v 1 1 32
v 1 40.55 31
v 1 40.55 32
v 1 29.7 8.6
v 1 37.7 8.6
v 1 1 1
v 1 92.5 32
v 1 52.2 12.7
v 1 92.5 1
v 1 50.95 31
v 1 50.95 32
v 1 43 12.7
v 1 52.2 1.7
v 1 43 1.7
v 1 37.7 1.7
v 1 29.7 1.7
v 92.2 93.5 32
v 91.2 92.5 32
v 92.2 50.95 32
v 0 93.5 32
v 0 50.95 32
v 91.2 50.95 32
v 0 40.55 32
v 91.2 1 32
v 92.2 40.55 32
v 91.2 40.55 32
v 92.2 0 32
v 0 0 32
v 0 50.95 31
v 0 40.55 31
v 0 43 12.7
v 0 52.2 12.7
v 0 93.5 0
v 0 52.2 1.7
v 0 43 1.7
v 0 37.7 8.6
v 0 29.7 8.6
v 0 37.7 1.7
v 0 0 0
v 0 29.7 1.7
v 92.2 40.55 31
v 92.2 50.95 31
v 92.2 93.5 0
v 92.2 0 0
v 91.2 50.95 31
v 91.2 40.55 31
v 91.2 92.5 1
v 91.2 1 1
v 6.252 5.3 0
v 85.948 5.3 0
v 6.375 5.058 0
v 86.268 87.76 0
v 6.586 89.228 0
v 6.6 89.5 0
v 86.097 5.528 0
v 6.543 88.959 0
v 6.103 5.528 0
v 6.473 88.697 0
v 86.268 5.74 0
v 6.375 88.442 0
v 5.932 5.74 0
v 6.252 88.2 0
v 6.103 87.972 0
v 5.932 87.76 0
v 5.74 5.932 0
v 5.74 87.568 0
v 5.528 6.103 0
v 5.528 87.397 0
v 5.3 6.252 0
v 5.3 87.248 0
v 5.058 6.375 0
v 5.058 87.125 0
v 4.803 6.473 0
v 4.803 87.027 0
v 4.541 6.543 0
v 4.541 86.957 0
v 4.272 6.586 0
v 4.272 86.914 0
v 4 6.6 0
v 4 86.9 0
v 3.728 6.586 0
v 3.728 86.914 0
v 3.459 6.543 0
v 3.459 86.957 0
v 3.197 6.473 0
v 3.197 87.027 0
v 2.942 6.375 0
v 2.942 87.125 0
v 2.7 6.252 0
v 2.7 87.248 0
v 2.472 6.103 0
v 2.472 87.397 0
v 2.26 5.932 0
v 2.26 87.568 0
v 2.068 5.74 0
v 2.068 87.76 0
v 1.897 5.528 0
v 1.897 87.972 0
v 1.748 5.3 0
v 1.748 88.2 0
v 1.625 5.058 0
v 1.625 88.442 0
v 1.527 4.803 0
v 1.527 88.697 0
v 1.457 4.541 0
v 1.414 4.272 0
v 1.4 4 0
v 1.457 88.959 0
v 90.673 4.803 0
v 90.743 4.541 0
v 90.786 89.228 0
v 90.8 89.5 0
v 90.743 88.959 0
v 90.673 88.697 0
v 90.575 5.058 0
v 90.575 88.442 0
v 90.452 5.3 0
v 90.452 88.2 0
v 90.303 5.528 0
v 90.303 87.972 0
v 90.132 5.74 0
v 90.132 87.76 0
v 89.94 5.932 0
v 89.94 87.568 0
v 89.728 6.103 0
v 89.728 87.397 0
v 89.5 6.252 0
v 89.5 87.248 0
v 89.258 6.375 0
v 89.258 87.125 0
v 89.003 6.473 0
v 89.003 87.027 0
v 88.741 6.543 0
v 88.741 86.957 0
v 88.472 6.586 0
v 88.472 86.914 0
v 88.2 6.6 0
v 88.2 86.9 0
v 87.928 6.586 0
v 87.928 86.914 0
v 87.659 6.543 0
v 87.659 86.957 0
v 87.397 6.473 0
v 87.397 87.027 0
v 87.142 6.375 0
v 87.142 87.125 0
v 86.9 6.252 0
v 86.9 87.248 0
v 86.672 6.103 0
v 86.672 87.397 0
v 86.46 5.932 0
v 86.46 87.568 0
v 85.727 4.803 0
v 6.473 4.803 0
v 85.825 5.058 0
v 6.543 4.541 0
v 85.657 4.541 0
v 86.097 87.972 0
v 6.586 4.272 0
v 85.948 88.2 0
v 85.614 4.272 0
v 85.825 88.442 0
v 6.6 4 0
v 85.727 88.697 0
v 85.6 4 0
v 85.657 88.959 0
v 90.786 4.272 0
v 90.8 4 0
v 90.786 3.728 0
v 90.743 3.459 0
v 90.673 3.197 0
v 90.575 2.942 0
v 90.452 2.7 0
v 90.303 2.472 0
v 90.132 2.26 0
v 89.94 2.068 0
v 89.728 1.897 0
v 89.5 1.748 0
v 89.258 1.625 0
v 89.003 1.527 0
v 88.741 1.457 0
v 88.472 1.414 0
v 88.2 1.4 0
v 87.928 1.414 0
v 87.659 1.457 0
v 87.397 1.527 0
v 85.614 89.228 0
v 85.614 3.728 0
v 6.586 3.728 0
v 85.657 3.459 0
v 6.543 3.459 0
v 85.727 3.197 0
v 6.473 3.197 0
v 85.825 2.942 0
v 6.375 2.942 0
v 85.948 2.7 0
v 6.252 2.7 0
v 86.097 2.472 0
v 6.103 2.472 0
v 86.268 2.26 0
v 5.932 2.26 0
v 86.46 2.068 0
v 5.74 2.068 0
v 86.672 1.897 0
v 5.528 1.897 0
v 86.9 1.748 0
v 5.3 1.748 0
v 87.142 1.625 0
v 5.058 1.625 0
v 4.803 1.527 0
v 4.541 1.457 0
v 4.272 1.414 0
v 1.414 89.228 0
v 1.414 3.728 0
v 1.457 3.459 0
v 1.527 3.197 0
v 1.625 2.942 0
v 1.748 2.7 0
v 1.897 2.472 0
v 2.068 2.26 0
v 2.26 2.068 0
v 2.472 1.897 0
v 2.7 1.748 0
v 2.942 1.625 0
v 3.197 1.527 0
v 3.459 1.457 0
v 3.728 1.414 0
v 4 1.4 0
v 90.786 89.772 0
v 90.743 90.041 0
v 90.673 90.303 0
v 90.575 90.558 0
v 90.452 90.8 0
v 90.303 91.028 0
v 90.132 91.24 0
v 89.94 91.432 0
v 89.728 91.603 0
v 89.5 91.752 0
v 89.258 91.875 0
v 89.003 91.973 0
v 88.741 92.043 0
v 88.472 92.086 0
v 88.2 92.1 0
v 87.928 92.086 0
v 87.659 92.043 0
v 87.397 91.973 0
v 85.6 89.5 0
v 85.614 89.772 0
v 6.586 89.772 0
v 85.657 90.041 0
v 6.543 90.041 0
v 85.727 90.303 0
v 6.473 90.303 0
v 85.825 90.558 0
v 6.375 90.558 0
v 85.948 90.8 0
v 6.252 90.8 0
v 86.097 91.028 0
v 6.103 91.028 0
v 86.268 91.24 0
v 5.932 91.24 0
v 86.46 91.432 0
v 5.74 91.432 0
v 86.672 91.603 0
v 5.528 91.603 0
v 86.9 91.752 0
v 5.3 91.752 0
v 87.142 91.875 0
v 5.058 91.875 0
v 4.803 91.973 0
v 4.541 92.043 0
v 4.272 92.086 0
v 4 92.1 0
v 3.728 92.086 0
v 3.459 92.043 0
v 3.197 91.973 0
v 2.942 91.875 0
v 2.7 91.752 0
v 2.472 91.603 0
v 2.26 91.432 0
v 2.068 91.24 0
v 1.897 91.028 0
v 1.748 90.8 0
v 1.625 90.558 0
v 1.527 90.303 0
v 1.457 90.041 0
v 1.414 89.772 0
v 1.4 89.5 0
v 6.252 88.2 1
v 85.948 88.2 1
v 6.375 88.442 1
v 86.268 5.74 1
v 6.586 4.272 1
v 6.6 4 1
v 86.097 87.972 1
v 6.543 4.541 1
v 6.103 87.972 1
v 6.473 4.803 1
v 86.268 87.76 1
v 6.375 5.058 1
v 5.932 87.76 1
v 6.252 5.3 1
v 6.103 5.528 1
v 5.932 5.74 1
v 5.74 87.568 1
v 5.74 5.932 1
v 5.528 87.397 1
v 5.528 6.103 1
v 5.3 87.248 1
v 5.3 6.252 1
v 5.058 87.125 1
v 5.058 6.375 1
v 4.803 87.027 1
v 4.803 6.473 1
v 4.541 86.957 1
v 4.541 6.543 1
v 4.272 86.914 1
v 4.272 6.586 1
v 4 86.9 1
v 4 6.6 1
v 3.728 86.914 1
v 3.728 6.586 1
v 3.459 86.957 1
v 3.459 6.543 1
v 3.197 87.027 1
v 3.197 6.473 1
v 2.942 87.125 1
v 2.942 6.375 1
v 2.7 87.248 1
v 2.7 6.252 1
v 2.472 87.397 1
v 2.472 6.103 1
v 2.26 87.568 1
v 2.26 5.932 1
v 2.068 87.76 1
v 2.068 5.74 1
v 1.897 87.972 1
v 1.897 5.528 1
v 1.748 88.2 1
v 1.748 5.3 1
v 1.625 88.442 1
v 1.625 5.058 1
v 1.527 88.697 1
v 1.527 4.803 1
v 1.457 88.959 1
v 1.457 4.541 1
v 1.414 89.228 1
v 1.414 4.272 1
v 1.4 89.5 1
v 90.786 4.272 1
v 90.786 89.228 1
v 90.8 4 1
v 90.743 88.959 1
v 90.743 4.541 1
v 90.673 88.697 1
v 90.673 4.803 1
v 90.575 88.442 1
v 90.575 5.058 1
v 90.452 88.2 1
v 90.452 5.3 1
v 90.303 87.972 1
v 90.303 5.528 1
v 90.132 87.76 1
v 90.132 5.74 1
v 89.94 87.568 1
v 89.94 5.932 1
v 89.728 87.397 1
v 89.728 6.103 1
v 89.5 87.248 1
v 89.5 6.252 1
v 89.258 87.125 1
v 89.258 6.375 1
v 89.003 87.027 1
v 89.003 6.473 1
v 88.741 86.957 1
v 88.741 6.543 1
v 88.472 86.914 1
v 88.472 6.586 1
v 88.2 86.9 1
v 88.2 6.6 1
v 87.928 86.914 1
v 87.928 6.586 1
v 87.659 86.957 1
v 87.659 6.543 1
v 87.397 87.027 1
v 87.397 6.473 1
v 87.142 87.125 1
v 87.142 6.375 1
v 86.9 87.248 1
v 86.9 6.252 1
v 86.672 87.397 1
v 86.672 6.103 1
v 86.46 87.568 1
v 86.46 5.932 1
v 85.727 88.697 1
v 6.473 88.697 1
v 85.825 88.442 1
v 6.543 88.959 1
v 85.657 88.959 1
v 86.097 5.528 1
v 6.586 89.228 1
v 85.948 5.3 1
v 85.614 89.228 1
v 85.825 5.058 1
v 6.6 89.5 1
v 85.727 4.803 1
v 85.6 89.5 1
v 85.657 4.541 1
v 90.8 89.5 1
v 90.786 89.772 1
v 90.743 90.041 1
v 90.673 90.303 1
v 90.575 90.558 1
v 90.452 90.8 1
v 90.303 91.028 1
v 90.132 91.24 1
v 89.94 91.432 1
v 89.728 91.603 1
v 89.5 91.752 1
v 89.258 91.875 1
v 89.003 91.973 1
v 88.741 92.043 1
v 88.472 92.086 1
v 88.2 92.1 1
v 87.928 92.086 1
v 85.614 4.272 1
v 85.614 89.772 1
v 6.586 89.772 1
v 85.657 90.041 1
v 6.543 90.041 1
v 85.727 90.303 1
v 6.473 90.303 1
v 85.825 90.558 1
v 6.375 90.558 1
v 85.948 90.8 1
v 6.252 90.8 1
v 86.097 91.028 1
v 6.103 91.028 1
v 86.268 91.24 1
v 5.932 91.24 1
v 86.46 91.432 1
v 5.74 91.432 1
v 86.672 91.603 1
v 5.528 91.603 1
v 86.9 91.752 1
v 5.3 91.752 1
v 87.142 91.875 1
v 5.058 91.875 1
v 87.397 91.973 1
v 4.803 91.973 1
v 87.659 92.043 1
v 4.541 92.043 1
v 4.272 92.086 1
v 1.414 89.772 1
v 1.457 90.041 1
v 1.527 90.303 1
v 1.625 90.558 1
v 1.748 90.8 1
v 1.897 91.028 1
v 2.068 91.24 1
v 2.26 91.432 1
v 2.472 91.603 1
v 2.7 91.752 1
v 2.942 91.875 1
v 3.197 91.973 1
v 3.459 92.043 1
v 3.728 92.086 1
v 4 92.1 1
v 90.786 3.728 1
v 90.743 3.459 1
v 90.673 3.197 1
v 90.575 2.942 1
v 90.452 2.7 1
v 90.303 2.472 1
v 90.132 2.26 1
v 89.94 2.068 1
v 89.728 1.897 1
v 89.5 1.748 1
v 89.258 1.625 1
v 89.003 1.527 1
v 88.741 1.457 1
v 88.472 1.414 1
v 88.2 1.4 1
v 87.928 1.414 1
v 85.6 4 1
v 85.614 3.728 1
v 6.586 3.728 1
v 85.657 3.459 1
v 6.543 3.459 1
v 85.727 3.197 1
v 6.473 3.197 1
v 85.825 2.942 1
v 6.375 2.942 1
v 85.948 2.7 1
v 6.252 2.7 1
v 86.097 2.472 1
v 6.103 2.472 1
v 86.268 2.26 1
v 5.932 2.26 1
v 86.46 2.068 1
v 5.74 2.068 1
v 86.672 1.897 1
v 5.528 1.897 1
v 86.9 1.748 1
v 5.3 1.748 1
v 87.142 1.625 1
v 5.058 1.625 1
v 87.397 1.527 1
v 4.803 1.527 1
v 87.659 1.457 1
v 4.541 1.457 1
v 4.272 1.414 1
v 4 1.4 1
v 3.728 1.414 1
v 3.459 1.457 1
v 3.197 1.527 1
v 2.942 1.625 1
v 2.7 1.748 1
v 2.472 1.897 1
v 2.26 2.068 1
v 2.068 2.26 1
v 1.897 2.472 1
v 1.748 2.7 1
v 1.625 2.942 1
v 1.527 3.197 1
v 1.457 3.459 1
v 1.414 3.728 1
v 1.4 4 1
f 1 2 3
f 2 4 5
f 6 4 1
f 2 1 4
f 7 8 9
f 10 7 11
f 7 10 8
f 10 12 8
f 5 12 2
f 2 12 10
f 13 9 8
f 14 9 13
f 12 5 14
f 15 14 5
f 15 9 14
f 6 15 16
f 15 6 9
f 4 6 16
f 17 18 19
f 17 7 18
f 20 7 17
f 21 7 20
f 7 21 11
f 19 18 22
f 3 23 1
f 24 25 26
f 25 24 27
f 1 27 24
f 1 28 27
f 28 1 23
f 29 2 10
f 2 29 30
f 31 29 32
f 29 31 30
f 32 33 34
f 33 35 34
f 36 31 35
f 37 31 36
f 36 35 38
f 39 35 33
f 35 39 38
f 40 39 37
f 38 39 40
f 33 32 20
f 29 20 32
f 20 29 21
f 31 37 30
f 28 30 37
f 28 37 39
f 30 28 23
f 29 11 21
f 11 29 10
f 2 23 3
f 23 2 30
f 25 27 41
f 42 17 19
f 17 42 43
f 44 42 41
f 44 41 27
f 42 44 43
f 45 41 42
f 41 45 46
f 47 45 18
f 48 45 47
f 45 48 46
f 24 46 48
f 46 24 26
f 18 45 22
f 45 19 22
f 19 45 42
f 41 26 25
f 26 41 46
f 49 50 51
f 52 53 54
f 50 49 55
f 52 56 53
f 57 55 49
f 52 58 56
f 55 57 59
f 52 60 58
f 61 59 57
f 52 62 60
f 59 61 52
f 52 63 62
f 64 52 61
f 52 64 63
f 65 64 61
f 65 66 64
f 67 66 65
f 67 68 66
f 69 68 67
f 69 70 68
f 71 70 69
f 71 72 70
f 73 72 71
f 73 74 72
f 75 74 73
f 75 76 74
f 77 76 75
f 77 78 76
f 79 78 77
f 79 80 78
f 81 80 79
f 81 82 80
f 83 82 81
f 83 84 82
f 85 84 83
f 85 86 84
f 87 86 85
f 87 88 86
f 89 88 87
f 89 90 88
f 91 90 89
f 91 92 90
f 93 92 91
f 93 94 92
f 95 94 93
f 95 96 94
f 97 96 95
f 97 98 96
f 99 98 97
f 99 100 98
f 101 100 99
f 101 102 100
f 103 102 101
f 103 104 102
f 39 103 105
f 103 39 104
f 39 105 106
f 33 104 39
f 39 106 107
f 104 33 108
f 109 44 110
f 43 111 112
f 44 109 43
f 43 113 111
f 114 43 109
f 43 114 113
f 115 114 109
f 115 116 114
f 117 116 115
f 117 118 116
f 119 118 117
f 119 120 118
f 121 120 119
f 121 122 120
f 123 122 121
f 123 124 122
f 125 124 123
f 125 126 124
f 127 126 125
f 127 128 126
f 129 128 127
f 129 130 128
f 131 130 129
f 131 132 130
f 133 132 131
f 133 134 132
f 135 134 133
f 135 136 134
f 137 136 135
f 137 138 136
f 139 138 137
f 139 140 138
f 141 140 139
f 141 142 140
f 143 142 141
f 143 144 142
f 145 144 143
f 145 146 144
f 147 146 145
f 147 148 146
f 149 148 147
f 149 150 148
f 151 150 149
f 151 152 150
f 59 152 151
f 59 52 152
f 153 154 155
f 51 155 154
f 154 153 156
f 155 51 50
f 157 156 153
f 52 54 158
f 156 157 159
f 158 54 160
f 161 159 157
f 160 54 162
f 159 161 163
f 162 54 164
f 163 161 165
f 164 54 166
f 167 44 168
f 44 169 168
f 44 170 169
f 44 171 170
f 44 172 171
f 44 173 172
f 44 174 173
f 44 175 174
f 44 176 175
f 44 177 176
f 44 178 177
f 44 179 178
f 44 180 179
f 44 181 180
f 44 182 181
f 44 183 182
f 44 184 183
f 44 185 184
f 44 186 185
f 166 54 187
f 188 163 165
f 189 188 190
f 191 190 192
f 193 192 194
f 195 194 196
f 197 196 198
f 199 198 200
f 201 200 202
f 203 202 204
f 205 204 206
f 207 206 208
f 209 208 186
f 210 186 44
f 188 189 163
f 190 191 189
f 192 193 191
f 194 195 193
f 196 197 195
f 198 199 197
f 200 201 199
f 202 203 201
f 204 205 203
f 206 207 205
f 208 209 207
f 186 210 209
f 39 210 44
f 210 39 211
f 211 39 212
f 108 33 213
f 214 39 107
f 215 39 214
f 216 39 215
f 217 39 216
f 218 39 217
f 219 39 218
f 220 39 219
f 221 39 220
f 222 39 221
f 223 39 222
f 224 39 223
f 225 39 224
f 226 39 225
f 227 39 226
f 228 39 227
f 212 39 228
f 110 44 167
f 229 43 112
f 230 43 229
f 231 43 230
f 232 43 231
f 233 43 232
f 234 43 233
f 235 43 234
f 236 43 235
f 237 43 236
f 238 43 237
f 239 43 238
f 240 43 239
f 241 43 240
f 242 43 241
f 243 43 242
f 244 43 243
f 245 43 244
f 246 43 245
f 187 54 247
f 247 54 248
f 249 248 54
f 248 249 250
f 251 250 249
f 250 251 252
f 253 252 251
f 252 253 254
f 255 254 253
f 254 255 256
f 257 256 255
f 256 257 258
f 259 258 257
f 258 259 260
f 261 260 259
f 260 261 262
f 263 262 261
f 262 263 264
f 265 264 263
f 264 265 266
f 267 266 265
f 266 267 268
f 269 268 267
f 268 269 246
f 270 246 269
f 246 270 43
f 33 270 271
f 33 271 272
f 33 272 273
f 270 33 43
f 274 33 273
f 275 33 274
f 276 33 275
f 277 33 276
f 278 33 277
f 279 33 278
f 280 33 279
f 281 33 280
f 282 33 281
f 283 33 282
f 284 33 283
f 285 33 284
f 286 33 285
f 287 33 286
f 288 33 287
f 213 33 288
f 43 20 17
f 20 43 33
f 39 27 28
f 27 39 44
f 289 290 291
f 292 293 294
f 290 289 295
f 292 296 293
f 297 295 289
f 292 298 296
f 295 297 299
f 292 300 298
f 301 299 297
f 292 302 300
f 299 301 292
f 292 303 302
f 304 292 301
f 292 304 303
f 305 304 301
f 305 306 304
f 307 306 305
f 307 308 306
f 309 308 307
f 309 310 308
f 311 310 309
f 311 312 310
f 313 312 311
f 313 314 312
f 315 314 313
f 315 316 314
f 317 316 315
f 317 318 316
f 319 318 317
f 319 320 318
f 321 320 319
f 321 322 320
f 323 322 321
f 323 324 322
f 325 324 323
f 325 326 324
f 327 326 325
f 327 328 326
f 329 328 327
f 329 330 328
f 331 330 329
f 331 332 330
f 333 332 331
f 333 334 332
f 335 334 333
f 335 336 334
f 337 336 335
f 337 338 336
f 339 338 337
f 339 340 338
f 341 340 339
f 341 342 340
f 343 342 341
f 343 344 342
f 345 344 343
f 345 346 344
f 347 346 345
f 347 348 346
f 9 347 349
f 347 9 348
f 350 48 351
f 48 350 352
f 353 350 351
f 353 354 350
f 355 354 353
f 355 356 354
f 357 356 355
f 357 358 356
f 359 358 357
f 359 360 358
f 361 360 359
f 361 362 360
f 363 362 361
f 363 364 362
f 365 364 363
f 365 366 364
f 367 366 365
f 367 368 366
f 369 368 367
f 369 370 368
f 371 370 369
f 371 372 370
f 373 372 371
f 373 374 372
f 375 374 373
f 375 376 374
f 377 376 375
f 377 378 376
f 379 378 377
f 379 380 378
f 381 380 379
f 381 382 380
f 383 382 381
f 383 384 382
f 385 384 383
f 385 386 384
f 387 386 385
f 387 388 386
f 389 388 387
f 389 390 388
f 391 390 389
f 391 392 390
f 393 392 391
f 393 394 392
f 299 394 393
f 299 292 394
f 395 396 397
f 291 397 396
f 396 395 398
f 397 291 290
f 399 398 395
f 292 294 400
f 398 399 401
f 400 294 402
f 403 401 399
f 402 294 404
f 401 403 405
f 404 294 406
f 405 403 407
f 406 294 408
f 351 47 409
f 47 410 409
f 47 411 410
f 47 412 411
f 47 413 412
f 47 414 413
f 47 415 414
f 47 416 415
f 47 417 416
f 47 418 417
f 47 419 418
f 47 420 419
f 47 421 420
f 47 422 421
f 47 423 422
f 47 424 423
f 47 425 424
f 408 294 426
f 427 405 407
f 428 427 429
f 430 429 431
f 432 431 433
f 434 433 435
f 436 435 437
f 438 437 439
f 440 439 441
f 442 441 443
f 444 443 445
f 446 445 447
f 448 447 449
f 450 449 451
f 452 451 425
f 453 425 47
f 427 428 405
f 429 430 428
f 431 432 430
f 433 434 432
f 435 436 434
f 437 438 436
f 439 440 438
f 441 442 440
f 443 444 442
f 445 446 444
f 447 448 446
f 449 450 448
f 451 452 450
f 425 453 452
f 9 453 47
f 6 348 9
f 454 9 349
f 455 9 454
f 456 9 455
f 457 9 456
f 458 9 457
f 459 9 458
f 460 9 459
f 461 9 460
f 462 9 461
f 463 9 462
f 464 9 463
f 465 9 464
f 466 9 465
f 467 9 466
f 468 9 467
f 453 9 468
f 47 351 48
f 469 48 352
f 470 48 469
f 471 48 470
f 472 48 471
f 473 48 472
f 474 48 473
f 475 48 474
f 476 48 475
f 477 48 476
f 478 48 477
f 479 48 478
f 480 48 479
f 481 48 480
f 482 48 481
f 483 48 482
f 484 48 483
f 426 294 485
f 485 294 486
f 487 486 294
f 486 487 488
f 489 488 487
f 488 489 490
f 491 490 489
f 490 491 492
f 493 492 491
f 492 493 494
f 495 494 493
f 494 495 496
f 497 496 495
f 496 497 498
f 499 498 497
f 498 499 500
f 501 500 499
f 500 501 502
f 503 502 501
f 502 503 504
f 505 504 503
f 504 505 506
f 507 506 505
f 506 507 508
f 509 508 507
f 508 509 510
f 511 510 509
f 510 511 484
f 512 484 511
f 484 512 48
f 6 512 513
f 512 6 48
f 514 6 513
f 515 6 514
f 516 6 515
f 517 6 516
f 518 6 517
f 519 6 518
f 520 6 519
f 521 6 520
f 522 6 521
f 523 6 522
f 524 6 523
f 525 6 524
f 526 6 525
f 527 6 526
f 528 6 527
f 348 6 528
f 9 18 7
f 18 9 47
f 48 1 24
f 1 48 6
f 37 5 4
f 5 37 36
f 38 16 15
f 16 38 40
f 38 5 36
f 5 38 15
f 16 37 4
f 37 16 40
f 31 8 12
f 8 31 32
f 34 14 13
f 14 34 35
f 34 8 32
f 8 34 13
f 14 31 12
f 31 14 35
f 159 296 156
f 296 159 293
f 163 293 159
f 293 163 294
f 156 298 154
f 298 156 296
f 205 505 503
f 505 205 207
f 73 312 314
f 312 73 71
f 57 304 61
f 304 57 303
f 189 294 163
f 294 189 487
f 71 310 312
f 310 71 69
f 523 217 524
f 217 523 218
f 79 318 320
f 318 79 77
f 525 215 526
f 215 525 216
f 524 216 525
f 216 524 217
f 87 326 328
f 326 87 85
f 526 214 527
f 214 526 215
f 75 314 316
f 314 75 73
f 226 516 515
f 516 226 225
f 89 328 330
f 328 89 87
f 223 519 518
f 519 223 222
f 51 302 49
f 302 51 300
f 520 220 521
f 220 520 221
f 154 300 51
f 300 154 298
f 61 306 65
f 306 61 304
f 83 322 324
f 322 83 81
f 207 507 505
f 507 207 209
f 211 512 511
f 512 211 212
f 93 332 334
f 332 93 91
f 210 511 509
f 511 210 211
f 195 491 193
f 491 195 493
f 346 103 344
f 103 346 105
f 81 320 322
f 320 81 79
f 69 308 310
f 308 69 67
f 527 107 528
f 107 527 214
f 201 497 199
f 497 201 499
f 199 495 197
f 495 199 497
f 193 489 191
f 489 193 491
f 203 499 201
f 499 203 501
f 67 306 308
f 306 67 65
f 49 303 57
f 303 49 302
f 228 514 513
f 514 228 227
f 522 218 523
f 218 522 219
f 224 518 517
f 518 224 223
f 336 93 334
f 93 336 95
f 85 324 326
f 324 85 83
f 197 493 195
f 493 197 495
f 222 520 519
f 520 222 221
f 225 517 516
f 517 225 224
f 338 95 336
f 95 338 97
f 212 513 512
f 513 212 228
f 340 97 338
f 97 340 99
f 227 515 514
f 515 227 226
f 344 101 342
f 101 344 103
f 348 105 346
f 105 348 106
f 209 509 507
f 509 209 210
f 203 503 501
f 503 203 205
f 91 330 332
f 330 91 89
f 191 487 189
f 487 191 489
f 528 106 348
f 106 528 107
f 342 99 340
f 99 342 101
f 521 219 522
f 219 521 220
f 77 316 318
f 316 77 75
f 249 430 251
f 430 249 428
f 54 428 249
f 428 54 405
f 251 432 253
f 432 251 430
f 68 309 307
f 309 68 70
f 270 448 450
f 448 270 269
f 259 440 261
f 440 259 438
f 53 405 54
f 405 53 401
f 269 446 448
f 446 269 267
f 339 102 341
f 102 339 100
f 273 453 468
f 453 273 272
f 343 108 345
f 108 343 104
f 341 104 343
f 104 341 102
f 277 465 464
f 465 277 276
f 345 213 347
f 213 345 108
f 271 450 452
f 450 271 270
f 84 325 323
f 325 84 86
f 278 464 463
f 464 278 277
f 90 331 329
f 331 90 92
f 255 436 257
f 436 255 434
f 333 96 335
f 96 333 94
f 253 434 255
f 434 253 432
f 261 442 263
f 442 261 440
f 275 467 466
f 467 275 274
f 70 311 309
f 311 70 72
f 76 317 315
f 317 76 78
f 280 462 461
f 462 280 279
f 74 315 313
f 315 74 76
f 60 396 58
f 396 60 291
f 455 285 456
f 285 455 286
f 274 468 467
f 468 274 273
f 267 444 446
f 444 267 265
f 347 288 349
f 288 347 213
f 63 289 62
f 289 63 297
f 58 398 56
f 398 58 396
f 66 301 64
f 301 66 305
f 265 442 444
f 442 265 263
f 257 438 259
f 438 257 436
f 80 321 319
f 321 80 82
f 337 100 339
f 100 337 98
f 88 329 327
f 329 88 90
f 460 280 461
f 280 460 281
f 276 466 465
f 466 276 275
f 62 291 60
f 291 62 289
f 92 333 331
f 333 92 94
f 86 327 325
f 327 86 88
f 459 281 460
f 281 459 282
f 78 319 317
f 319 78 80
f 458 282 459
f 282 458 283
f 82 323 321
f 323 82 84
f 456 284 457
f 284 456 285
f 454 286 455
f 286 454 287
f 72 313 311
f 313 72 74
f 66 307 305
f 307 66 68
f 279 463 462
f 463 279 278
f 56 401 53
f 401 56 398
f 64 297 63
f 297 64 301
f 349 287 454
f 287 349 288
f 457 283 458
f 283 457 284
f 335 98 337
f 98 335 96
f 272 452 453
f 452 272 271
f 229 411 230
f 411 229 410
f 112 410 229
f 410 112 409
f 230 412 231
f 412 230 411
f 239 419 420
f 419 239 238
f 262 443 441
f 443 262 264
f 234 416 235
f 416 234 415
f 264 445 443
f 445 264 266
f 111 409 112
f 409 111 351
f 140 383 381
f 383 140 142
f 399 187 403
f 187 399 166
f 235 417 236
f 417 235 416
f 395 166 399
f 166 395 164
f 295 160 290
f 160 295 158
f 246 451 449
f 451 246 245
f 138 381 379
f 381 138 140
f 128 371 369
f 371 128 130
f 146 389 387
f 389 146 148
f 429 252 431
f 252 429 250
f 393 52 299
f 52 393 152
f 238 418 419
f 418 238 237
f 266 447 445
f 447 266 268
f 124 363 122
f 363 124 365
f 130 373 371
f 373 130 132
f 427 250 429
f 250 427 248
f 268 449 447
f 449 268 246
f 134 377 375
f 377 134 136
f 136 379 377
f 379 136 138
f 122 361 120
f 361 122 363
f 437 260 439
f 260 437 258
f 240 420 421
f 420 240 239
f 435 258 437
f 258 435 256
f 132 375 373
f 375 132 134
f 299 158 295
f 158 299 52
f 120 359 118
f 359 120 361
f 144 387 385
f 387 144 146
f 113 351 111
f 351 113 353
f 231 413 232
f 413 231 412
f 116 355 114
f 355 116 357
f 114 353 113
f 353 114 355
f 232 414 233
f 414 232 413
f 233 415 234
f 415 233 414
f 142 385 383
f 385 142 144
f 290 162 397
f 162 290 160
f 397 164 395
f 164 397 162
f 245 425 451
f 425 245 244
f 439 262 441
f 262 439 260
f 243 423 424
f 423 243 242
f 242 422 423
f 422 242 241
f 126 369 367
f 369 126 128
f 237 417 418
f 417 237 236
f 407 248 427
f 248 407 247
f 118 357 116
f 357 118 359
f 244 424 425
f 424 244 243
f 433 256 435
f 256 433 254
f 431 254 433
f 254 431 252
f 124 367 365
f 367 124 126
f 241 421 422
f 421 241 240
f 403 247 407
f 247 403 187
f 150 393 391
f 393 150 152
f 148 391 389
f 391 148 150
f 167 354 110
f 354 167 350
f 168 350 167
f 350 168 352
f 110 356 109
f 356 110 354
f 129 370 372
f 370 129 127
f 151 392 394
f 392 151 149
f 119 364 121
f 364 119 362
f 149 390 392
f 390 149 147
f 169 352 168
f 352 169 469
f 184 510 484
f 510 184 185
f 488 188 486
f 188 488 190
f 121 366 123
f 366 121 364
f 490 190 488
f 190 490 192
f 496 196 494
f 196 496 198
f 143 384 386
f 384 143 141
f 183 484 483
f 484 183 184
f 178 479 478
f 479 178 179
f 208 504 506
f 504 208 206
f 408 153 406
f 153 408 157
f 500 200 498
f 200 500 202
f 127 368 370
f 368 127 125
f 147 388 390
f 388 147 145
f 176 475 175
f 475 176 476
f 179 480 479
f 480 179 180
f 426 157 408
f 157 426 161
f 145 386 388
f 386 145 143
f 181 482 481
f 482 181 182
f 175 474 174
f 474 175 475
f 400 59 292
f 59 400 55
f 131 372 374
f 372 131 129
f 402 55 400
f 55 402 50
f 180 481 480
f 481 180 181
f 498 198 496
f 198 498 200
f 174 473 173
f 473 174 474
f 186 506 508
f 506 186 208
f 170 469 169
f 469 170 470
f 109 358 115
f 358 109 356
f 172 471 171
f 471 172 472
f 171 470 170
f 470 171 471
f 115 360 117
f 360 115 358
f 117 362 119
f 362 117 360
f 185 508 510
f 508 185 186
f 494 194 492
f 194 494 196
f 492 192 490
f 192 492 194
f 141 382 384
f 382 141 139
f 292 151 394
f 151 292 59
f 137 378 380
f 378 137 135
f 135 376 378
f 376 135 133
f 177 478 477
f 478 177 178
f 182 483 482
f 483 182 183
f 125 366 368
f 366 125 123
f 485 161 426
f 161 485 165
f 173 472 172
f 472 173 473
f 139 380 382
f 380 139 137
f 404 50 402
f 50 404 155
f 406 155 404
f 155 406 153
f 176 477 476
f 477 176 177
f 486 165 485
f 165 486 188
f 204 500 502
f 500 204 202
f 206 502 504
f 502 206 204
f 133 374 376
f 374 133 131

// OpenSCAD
$fs=0.25;$fa=6;
difference(){difference(){difference(){difference(){difference(){translate([46.1,46.75,16])cube([92.2,93.5,32],center=true);
translate([1,0,31])union() {
translate([-0.5,45.75,0.5])cube([1,10.4,1],center=true);
translate([90.7,45.75,0.5])cube([1,10.4,1],center=true);
}
}translate([46.1,46.75,16.5])cube([90.2,91.5,31],center=true);
}translate([0.5,33.7,5.15])cube([1,8,6.9],center=true);
}translate([0.5,47.6,7.2])cube([1,9.2,11],center=true);
}union() {
translate([4,4,0])cylinder(h=2.7, r=2.6, center=true);
translate([4,89.5,0])cylinder(h=2.7, r=2.6, center=true);
translate([88.2,89.5,0])cylinder(h=2.7, r=2.6, center=true);
translate([88.2,4,0])cylinder(h=2.7, r=2.6, center=true);
}
}
